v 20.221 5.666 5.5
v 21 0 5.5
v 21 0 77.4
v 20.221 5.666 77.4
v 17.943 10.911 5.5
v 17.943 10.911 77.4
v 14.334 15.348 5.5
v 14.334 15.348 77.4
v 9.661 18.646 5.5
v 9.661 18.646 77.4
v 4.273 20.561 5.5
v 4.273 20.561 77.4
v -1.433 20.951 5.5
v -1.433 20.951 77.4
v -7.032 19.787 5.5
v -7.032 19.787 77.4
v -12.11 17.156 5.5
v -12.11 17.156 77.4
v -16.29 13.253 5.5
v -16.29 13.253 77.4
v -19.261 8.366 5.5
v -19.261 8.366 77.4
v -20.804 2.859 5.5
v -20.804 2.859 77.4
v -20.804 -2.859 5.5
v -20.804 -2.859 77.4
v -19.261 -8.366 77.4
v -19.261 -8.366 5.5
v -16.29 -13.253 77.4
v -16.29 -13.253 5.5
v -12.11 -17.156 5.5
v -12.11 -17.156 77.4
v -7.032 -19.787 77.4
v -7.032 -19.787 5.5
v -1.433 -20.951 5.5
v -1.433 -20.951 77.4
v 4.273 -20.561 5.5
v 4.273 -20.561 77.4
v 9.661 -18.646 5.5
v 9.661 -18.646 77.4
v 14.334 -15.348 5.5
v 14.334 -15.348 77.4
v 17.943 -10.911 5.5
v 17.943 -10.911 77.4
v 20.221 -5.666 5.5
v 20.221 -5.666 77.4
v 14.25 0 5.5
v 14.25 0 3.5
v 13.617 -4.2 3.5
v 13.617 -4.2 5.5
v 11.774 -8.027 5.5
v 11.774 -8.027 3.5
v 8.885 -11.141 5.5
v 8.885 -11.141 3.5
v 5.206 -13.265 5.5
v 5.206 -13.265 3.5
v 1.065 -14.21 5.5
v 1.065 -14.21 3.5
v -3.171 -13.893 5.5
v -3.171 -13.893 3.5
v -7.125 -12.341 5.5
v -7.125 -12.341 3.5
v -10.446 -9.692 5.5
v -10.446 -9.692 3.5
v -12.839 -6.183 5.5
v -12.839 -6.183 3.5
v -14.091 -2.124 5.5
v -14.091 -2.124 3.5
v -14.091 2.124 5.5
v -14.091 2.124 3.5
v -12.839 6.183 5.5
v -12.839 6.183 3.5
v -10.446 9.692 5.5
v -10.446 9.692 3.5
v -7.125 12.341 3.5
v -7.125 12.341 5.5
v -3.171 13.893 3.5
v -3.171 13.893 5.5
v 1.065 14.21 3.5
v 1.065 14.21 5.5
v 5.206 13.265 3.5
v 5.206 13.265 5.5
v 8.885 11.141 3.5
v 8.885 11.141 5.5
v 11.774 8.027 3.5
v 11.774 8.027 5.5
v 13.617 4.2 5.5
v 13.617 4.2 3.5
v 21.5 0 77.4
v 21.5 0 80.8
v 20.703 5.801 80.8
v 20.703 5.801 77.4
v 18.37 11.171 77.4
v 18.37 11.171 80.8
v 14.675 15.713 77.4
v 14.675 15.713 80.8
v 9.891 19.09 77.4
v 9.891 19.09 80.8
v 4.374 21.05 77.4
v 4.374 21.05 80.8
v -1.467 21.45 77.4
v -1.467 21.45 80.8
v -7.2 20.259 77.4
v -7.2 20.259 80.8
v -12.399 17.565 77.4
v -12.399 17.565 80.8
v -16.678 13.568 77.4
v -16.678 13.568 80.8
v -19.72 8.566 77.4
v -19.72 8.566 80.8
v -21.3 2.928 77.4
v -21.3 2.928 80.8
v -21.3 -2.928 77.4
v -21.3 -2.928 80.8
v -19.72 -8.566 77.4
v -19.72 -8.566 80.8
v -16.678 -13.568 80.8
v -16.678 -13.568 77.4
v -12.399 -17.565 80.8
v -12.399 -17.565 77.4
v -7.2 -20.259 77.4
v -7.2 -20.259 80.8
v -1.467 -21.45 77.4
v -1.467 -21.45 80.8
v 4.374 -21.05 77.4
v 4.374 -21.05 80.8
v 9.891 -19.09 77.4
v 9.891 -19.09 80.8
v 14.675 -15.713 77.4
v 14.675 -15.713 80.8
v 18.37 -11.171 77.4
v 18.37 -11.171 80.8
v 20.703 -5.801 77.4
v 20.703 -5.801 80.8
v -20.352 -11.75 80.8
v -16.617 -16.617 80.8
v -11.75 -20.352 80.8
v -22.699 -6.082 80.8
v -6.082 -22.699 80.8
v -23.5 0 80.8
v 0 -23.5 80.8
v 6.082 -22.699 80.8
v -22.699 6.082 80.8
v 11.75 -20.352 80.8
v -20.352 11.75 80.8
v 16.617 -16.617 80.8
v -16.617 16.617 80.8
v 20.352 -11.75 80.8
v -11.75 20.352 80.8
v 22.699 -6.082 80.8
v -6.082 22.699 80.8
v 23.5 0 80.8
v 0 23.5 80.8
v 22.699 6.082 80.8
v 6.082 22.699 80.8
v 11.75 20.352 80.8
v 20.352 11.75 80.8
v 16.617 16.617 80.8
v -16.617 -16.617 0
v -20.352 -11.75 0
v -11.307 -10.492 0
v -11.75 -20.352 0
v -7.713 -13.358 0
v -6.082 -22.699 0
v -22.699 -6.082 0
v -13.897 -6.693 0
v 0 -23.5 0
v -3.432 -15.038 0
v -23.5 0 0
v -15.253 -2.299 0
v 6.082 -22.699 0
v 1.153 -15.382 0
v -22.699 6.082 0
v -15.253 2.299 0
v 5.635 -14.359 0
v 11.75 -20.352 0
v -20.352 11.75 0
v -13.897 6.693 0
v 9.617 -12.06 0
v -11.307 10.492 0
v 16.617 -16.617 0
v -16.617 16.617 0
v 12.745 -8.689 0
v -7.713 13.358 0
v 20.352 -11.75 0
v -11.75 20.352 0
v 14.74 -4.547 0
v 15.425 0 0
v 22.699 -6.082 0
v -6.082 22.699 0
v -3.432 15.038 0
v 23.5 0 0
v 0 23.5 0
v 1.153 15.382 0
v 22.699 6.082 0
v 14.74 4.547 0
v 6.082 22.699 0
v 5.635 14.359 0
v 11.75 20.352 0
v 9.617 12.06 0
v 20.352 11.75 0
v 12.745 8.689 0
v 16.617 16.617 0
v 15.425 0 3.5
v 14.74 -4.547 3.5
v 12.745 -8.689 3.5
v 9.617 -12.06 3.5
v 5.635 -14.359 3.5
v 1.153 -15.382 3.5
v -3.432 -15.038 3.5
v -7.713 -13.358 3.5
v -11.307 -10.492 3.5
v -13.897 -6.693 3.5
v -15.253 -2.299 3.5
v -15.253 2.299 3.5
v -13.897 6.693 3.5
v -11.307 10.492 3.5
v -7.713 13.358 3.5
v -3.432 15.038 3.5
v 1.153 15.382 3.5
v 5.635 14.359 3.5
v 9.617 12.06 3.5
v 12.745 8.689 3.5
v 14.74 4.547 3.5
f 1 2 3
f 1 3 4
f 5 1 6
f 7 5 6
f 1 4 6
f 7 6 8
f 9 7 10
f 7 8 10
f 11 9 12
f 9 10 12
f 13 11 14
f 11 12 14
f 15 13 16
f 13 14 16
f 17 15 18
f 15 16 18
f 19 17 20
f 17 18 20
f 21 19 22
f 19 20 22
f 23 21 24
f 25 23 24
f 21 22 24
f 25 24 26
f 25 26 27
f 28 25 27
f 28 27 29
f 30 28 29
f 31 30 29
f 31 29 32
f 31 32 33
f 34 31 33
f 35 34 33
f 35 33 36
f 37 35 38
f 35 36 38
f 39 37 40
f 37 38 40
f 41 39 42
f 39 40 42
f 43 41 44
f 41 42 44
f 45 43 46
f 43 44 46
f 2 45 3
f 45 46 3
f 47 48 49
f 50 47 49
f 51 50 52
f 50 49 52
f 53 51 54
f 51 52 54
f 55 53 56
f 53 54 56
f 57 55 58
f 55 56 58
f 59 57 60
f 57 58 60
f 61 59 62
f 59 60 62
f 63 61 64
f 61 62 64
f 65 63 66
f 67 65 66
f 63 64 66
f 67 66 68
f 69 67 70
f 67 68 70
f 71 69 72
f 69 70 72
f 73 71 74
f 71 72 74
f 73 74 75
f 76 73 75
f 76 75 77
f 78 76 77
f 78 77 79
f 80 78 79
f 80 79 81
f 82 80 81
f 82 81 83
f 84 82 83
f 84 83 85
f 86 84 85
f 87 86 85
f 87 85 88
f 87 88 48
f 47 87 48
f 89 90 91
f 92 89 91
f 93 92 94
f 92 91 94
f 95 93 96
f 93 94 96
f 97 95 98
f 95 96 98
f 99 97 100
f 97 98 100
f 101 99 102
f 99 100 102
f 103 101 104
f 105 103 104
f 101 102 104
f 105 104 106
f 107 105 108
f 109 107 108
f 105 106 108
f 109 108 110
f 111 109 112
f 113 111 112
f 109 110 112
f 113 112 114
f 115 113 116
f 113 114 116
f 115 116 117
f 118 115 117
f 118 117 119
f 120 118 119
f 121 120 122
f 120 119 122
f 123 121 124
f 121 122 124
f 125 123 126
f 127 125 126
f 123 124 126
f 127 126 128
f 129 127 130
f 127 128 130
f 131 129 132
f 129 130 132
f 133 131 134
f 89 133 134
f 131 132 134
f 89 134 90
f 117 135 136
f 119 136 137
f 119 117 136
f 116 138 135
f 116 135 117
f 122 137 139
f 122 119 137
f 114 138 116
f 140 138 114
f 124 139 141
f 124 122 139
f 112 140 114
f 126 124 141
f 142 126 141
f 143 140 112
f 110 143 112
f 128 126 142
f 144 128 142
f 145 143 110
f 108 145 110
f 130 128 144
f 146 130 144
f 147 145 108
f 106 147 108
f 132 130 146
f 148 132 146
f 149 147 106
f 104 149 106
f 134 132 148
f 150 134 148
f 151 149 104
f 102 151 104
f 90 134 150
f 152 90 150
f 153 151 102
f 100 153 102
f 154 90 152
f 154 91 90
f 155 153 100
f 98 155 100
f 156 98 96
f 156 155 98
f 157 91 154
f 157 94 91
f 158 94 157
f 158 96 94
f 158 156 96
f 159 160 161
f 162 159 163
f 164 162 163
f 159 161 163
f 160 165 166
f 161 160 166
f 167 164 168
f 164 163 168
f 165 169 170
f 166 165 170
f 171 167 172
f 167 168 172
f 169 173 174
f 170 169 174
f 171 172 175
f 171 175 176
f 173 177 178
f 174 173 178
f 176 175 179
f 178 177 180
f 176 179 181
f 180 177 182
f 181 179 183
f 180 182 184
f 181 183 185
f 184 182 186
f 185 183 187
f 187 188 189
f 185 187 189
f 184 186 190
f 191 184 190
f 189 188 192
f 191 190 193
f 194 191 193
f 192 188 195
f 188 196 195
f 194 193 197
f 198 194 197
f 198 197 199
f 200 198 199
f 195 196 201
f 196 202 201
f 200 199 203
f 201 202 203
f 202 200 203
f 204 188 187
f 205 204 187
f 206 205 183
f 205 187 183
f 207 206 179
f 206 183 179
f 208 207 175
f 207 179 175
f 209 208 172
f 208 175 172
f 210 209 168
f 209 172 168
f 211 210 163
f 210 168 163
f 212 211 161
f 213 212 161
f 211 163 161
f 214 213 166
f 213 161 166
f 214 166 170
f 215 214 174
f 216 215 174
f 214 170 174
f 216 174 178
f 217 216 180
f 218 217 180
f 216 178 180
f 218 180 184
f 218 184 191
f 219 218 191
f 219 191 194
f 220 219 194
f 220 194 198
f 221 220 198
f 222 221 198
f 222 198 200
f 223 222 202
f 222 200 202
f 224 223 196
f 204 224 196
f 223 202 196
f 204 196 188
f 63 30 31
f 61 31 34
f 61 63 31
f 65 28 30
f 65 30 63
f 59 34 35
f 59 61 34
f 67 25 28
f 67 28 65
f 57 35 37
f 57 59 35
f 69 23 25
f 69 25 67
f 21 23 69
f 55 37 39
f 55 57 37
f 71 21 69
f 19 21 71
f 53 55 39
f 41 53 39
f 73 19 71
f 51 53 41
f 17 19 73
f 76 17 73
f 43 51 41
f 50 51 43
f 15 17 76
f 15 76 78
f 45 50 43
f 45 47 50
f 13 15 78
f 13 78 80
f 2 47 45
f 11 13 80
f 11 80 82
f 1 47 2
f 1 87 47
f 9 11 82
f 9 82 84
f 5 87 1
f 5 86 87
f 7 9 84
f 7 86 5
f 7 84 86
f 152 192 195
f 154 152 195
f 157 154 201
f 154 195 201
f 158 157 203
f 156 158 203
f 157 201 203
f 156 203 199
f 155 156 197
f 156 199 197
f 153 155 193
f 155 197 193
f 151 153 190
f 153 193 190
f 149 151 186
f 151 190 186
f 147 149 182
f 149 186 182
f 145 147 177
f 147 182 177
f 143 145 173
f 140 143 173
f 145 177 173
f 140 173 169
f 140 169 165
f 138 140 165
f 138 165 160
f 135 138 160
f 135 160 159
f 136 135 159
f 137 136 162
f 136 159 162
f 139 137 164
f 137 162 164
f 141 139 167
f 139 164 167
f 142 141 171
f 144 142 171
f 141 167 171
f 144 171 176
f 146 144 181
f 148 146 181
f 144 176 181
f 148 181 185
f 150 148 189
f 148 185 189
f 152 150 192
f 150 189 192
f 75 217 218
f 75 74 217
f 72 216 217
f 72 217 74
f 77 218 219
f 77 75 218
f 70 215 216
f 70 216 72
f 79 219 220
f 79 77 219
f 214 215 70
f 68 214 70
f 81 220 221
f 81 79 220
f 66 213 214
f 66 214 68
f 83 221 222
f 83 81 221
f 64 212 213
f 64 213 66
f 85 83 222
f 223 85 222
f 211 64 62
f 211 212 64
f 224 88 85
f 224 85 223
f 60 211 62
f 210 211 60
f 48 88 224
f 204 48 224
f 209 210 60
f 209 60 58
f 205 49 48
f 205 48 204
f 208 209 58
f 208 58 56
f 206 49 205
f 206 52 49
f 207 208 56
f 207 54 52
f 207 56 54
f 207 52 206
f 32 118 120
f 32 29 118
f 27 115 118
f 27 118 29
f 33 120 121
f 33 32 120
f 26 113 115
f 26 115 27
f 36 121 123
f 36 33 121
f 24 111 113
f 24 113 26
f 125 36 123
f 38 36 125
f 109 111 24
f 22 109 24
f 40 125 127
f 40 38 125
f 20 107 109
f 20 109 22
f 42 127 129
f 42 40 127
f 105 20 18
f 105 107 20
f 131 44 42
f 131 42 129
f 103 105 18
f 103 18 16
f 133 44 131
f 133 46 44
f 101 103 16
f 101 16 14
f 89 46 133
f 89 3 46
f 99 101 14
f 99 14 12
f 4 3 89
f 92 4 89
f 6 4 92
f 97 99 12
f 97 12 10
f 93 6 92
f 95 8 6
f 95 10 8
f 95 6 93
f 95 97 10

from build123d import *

# Parameters (mm, degrees)
F0_R     = 23.5
F1_DEPTH = 80.8
F2_R     = 21.5
F3_DEPTH = 3.4
F5_R     = 15.425
F6_DEPTH = 3.5
F7_R     = 14.25
F8_DEPTH = 77.301
F4_R     = 21
F9_DEPTH = 71.9


with BuildPart() as f1:
    # F0 (on Top) → F1 (new body)
    with BuildSketch(Plane.XY):
        Circle(F0_R)
    extrude(amount=F1_DEPTH)

    # F2 (on face) → F3 (cut)
    with BuildSketch(Plane.XY.offset(80.8)):
        Circle(F2_R)
    extrude(amount=-F3_DEPTH, mode=Mode.SUBTRACT)

    # F5 (on face) → F6 (cut)
    with BuildSketch(Plane(origin=(0, 0, 0), x_dir=(1, 0, 0), z_dir=(0, 0, -1))):
        Circle(F5_R)
    extrude(amount=-F6_DEPTH, mode=Mode.SUBTRACT)

    # F7 (on face) → F8 (cut, through all)
    with BuildSketch(Plane(origin=(0, 0, 3.5), x_dir=(1, 0, 0), z_dir=(0, 0, -1))):
        Circle(F7_R)
    extrude(amount=-F8_DEPTH, mode=Mode.SUBTRACT)

    # F4 (on face) → F9 (cut, through all)
    with BuildSketch(Plane.XY.offset(77.4)):
        Circle(F4_R)
    extrude(amount=-F9_DEPTH, mode=Mode.SUBTRACT)


solid = f1.part
